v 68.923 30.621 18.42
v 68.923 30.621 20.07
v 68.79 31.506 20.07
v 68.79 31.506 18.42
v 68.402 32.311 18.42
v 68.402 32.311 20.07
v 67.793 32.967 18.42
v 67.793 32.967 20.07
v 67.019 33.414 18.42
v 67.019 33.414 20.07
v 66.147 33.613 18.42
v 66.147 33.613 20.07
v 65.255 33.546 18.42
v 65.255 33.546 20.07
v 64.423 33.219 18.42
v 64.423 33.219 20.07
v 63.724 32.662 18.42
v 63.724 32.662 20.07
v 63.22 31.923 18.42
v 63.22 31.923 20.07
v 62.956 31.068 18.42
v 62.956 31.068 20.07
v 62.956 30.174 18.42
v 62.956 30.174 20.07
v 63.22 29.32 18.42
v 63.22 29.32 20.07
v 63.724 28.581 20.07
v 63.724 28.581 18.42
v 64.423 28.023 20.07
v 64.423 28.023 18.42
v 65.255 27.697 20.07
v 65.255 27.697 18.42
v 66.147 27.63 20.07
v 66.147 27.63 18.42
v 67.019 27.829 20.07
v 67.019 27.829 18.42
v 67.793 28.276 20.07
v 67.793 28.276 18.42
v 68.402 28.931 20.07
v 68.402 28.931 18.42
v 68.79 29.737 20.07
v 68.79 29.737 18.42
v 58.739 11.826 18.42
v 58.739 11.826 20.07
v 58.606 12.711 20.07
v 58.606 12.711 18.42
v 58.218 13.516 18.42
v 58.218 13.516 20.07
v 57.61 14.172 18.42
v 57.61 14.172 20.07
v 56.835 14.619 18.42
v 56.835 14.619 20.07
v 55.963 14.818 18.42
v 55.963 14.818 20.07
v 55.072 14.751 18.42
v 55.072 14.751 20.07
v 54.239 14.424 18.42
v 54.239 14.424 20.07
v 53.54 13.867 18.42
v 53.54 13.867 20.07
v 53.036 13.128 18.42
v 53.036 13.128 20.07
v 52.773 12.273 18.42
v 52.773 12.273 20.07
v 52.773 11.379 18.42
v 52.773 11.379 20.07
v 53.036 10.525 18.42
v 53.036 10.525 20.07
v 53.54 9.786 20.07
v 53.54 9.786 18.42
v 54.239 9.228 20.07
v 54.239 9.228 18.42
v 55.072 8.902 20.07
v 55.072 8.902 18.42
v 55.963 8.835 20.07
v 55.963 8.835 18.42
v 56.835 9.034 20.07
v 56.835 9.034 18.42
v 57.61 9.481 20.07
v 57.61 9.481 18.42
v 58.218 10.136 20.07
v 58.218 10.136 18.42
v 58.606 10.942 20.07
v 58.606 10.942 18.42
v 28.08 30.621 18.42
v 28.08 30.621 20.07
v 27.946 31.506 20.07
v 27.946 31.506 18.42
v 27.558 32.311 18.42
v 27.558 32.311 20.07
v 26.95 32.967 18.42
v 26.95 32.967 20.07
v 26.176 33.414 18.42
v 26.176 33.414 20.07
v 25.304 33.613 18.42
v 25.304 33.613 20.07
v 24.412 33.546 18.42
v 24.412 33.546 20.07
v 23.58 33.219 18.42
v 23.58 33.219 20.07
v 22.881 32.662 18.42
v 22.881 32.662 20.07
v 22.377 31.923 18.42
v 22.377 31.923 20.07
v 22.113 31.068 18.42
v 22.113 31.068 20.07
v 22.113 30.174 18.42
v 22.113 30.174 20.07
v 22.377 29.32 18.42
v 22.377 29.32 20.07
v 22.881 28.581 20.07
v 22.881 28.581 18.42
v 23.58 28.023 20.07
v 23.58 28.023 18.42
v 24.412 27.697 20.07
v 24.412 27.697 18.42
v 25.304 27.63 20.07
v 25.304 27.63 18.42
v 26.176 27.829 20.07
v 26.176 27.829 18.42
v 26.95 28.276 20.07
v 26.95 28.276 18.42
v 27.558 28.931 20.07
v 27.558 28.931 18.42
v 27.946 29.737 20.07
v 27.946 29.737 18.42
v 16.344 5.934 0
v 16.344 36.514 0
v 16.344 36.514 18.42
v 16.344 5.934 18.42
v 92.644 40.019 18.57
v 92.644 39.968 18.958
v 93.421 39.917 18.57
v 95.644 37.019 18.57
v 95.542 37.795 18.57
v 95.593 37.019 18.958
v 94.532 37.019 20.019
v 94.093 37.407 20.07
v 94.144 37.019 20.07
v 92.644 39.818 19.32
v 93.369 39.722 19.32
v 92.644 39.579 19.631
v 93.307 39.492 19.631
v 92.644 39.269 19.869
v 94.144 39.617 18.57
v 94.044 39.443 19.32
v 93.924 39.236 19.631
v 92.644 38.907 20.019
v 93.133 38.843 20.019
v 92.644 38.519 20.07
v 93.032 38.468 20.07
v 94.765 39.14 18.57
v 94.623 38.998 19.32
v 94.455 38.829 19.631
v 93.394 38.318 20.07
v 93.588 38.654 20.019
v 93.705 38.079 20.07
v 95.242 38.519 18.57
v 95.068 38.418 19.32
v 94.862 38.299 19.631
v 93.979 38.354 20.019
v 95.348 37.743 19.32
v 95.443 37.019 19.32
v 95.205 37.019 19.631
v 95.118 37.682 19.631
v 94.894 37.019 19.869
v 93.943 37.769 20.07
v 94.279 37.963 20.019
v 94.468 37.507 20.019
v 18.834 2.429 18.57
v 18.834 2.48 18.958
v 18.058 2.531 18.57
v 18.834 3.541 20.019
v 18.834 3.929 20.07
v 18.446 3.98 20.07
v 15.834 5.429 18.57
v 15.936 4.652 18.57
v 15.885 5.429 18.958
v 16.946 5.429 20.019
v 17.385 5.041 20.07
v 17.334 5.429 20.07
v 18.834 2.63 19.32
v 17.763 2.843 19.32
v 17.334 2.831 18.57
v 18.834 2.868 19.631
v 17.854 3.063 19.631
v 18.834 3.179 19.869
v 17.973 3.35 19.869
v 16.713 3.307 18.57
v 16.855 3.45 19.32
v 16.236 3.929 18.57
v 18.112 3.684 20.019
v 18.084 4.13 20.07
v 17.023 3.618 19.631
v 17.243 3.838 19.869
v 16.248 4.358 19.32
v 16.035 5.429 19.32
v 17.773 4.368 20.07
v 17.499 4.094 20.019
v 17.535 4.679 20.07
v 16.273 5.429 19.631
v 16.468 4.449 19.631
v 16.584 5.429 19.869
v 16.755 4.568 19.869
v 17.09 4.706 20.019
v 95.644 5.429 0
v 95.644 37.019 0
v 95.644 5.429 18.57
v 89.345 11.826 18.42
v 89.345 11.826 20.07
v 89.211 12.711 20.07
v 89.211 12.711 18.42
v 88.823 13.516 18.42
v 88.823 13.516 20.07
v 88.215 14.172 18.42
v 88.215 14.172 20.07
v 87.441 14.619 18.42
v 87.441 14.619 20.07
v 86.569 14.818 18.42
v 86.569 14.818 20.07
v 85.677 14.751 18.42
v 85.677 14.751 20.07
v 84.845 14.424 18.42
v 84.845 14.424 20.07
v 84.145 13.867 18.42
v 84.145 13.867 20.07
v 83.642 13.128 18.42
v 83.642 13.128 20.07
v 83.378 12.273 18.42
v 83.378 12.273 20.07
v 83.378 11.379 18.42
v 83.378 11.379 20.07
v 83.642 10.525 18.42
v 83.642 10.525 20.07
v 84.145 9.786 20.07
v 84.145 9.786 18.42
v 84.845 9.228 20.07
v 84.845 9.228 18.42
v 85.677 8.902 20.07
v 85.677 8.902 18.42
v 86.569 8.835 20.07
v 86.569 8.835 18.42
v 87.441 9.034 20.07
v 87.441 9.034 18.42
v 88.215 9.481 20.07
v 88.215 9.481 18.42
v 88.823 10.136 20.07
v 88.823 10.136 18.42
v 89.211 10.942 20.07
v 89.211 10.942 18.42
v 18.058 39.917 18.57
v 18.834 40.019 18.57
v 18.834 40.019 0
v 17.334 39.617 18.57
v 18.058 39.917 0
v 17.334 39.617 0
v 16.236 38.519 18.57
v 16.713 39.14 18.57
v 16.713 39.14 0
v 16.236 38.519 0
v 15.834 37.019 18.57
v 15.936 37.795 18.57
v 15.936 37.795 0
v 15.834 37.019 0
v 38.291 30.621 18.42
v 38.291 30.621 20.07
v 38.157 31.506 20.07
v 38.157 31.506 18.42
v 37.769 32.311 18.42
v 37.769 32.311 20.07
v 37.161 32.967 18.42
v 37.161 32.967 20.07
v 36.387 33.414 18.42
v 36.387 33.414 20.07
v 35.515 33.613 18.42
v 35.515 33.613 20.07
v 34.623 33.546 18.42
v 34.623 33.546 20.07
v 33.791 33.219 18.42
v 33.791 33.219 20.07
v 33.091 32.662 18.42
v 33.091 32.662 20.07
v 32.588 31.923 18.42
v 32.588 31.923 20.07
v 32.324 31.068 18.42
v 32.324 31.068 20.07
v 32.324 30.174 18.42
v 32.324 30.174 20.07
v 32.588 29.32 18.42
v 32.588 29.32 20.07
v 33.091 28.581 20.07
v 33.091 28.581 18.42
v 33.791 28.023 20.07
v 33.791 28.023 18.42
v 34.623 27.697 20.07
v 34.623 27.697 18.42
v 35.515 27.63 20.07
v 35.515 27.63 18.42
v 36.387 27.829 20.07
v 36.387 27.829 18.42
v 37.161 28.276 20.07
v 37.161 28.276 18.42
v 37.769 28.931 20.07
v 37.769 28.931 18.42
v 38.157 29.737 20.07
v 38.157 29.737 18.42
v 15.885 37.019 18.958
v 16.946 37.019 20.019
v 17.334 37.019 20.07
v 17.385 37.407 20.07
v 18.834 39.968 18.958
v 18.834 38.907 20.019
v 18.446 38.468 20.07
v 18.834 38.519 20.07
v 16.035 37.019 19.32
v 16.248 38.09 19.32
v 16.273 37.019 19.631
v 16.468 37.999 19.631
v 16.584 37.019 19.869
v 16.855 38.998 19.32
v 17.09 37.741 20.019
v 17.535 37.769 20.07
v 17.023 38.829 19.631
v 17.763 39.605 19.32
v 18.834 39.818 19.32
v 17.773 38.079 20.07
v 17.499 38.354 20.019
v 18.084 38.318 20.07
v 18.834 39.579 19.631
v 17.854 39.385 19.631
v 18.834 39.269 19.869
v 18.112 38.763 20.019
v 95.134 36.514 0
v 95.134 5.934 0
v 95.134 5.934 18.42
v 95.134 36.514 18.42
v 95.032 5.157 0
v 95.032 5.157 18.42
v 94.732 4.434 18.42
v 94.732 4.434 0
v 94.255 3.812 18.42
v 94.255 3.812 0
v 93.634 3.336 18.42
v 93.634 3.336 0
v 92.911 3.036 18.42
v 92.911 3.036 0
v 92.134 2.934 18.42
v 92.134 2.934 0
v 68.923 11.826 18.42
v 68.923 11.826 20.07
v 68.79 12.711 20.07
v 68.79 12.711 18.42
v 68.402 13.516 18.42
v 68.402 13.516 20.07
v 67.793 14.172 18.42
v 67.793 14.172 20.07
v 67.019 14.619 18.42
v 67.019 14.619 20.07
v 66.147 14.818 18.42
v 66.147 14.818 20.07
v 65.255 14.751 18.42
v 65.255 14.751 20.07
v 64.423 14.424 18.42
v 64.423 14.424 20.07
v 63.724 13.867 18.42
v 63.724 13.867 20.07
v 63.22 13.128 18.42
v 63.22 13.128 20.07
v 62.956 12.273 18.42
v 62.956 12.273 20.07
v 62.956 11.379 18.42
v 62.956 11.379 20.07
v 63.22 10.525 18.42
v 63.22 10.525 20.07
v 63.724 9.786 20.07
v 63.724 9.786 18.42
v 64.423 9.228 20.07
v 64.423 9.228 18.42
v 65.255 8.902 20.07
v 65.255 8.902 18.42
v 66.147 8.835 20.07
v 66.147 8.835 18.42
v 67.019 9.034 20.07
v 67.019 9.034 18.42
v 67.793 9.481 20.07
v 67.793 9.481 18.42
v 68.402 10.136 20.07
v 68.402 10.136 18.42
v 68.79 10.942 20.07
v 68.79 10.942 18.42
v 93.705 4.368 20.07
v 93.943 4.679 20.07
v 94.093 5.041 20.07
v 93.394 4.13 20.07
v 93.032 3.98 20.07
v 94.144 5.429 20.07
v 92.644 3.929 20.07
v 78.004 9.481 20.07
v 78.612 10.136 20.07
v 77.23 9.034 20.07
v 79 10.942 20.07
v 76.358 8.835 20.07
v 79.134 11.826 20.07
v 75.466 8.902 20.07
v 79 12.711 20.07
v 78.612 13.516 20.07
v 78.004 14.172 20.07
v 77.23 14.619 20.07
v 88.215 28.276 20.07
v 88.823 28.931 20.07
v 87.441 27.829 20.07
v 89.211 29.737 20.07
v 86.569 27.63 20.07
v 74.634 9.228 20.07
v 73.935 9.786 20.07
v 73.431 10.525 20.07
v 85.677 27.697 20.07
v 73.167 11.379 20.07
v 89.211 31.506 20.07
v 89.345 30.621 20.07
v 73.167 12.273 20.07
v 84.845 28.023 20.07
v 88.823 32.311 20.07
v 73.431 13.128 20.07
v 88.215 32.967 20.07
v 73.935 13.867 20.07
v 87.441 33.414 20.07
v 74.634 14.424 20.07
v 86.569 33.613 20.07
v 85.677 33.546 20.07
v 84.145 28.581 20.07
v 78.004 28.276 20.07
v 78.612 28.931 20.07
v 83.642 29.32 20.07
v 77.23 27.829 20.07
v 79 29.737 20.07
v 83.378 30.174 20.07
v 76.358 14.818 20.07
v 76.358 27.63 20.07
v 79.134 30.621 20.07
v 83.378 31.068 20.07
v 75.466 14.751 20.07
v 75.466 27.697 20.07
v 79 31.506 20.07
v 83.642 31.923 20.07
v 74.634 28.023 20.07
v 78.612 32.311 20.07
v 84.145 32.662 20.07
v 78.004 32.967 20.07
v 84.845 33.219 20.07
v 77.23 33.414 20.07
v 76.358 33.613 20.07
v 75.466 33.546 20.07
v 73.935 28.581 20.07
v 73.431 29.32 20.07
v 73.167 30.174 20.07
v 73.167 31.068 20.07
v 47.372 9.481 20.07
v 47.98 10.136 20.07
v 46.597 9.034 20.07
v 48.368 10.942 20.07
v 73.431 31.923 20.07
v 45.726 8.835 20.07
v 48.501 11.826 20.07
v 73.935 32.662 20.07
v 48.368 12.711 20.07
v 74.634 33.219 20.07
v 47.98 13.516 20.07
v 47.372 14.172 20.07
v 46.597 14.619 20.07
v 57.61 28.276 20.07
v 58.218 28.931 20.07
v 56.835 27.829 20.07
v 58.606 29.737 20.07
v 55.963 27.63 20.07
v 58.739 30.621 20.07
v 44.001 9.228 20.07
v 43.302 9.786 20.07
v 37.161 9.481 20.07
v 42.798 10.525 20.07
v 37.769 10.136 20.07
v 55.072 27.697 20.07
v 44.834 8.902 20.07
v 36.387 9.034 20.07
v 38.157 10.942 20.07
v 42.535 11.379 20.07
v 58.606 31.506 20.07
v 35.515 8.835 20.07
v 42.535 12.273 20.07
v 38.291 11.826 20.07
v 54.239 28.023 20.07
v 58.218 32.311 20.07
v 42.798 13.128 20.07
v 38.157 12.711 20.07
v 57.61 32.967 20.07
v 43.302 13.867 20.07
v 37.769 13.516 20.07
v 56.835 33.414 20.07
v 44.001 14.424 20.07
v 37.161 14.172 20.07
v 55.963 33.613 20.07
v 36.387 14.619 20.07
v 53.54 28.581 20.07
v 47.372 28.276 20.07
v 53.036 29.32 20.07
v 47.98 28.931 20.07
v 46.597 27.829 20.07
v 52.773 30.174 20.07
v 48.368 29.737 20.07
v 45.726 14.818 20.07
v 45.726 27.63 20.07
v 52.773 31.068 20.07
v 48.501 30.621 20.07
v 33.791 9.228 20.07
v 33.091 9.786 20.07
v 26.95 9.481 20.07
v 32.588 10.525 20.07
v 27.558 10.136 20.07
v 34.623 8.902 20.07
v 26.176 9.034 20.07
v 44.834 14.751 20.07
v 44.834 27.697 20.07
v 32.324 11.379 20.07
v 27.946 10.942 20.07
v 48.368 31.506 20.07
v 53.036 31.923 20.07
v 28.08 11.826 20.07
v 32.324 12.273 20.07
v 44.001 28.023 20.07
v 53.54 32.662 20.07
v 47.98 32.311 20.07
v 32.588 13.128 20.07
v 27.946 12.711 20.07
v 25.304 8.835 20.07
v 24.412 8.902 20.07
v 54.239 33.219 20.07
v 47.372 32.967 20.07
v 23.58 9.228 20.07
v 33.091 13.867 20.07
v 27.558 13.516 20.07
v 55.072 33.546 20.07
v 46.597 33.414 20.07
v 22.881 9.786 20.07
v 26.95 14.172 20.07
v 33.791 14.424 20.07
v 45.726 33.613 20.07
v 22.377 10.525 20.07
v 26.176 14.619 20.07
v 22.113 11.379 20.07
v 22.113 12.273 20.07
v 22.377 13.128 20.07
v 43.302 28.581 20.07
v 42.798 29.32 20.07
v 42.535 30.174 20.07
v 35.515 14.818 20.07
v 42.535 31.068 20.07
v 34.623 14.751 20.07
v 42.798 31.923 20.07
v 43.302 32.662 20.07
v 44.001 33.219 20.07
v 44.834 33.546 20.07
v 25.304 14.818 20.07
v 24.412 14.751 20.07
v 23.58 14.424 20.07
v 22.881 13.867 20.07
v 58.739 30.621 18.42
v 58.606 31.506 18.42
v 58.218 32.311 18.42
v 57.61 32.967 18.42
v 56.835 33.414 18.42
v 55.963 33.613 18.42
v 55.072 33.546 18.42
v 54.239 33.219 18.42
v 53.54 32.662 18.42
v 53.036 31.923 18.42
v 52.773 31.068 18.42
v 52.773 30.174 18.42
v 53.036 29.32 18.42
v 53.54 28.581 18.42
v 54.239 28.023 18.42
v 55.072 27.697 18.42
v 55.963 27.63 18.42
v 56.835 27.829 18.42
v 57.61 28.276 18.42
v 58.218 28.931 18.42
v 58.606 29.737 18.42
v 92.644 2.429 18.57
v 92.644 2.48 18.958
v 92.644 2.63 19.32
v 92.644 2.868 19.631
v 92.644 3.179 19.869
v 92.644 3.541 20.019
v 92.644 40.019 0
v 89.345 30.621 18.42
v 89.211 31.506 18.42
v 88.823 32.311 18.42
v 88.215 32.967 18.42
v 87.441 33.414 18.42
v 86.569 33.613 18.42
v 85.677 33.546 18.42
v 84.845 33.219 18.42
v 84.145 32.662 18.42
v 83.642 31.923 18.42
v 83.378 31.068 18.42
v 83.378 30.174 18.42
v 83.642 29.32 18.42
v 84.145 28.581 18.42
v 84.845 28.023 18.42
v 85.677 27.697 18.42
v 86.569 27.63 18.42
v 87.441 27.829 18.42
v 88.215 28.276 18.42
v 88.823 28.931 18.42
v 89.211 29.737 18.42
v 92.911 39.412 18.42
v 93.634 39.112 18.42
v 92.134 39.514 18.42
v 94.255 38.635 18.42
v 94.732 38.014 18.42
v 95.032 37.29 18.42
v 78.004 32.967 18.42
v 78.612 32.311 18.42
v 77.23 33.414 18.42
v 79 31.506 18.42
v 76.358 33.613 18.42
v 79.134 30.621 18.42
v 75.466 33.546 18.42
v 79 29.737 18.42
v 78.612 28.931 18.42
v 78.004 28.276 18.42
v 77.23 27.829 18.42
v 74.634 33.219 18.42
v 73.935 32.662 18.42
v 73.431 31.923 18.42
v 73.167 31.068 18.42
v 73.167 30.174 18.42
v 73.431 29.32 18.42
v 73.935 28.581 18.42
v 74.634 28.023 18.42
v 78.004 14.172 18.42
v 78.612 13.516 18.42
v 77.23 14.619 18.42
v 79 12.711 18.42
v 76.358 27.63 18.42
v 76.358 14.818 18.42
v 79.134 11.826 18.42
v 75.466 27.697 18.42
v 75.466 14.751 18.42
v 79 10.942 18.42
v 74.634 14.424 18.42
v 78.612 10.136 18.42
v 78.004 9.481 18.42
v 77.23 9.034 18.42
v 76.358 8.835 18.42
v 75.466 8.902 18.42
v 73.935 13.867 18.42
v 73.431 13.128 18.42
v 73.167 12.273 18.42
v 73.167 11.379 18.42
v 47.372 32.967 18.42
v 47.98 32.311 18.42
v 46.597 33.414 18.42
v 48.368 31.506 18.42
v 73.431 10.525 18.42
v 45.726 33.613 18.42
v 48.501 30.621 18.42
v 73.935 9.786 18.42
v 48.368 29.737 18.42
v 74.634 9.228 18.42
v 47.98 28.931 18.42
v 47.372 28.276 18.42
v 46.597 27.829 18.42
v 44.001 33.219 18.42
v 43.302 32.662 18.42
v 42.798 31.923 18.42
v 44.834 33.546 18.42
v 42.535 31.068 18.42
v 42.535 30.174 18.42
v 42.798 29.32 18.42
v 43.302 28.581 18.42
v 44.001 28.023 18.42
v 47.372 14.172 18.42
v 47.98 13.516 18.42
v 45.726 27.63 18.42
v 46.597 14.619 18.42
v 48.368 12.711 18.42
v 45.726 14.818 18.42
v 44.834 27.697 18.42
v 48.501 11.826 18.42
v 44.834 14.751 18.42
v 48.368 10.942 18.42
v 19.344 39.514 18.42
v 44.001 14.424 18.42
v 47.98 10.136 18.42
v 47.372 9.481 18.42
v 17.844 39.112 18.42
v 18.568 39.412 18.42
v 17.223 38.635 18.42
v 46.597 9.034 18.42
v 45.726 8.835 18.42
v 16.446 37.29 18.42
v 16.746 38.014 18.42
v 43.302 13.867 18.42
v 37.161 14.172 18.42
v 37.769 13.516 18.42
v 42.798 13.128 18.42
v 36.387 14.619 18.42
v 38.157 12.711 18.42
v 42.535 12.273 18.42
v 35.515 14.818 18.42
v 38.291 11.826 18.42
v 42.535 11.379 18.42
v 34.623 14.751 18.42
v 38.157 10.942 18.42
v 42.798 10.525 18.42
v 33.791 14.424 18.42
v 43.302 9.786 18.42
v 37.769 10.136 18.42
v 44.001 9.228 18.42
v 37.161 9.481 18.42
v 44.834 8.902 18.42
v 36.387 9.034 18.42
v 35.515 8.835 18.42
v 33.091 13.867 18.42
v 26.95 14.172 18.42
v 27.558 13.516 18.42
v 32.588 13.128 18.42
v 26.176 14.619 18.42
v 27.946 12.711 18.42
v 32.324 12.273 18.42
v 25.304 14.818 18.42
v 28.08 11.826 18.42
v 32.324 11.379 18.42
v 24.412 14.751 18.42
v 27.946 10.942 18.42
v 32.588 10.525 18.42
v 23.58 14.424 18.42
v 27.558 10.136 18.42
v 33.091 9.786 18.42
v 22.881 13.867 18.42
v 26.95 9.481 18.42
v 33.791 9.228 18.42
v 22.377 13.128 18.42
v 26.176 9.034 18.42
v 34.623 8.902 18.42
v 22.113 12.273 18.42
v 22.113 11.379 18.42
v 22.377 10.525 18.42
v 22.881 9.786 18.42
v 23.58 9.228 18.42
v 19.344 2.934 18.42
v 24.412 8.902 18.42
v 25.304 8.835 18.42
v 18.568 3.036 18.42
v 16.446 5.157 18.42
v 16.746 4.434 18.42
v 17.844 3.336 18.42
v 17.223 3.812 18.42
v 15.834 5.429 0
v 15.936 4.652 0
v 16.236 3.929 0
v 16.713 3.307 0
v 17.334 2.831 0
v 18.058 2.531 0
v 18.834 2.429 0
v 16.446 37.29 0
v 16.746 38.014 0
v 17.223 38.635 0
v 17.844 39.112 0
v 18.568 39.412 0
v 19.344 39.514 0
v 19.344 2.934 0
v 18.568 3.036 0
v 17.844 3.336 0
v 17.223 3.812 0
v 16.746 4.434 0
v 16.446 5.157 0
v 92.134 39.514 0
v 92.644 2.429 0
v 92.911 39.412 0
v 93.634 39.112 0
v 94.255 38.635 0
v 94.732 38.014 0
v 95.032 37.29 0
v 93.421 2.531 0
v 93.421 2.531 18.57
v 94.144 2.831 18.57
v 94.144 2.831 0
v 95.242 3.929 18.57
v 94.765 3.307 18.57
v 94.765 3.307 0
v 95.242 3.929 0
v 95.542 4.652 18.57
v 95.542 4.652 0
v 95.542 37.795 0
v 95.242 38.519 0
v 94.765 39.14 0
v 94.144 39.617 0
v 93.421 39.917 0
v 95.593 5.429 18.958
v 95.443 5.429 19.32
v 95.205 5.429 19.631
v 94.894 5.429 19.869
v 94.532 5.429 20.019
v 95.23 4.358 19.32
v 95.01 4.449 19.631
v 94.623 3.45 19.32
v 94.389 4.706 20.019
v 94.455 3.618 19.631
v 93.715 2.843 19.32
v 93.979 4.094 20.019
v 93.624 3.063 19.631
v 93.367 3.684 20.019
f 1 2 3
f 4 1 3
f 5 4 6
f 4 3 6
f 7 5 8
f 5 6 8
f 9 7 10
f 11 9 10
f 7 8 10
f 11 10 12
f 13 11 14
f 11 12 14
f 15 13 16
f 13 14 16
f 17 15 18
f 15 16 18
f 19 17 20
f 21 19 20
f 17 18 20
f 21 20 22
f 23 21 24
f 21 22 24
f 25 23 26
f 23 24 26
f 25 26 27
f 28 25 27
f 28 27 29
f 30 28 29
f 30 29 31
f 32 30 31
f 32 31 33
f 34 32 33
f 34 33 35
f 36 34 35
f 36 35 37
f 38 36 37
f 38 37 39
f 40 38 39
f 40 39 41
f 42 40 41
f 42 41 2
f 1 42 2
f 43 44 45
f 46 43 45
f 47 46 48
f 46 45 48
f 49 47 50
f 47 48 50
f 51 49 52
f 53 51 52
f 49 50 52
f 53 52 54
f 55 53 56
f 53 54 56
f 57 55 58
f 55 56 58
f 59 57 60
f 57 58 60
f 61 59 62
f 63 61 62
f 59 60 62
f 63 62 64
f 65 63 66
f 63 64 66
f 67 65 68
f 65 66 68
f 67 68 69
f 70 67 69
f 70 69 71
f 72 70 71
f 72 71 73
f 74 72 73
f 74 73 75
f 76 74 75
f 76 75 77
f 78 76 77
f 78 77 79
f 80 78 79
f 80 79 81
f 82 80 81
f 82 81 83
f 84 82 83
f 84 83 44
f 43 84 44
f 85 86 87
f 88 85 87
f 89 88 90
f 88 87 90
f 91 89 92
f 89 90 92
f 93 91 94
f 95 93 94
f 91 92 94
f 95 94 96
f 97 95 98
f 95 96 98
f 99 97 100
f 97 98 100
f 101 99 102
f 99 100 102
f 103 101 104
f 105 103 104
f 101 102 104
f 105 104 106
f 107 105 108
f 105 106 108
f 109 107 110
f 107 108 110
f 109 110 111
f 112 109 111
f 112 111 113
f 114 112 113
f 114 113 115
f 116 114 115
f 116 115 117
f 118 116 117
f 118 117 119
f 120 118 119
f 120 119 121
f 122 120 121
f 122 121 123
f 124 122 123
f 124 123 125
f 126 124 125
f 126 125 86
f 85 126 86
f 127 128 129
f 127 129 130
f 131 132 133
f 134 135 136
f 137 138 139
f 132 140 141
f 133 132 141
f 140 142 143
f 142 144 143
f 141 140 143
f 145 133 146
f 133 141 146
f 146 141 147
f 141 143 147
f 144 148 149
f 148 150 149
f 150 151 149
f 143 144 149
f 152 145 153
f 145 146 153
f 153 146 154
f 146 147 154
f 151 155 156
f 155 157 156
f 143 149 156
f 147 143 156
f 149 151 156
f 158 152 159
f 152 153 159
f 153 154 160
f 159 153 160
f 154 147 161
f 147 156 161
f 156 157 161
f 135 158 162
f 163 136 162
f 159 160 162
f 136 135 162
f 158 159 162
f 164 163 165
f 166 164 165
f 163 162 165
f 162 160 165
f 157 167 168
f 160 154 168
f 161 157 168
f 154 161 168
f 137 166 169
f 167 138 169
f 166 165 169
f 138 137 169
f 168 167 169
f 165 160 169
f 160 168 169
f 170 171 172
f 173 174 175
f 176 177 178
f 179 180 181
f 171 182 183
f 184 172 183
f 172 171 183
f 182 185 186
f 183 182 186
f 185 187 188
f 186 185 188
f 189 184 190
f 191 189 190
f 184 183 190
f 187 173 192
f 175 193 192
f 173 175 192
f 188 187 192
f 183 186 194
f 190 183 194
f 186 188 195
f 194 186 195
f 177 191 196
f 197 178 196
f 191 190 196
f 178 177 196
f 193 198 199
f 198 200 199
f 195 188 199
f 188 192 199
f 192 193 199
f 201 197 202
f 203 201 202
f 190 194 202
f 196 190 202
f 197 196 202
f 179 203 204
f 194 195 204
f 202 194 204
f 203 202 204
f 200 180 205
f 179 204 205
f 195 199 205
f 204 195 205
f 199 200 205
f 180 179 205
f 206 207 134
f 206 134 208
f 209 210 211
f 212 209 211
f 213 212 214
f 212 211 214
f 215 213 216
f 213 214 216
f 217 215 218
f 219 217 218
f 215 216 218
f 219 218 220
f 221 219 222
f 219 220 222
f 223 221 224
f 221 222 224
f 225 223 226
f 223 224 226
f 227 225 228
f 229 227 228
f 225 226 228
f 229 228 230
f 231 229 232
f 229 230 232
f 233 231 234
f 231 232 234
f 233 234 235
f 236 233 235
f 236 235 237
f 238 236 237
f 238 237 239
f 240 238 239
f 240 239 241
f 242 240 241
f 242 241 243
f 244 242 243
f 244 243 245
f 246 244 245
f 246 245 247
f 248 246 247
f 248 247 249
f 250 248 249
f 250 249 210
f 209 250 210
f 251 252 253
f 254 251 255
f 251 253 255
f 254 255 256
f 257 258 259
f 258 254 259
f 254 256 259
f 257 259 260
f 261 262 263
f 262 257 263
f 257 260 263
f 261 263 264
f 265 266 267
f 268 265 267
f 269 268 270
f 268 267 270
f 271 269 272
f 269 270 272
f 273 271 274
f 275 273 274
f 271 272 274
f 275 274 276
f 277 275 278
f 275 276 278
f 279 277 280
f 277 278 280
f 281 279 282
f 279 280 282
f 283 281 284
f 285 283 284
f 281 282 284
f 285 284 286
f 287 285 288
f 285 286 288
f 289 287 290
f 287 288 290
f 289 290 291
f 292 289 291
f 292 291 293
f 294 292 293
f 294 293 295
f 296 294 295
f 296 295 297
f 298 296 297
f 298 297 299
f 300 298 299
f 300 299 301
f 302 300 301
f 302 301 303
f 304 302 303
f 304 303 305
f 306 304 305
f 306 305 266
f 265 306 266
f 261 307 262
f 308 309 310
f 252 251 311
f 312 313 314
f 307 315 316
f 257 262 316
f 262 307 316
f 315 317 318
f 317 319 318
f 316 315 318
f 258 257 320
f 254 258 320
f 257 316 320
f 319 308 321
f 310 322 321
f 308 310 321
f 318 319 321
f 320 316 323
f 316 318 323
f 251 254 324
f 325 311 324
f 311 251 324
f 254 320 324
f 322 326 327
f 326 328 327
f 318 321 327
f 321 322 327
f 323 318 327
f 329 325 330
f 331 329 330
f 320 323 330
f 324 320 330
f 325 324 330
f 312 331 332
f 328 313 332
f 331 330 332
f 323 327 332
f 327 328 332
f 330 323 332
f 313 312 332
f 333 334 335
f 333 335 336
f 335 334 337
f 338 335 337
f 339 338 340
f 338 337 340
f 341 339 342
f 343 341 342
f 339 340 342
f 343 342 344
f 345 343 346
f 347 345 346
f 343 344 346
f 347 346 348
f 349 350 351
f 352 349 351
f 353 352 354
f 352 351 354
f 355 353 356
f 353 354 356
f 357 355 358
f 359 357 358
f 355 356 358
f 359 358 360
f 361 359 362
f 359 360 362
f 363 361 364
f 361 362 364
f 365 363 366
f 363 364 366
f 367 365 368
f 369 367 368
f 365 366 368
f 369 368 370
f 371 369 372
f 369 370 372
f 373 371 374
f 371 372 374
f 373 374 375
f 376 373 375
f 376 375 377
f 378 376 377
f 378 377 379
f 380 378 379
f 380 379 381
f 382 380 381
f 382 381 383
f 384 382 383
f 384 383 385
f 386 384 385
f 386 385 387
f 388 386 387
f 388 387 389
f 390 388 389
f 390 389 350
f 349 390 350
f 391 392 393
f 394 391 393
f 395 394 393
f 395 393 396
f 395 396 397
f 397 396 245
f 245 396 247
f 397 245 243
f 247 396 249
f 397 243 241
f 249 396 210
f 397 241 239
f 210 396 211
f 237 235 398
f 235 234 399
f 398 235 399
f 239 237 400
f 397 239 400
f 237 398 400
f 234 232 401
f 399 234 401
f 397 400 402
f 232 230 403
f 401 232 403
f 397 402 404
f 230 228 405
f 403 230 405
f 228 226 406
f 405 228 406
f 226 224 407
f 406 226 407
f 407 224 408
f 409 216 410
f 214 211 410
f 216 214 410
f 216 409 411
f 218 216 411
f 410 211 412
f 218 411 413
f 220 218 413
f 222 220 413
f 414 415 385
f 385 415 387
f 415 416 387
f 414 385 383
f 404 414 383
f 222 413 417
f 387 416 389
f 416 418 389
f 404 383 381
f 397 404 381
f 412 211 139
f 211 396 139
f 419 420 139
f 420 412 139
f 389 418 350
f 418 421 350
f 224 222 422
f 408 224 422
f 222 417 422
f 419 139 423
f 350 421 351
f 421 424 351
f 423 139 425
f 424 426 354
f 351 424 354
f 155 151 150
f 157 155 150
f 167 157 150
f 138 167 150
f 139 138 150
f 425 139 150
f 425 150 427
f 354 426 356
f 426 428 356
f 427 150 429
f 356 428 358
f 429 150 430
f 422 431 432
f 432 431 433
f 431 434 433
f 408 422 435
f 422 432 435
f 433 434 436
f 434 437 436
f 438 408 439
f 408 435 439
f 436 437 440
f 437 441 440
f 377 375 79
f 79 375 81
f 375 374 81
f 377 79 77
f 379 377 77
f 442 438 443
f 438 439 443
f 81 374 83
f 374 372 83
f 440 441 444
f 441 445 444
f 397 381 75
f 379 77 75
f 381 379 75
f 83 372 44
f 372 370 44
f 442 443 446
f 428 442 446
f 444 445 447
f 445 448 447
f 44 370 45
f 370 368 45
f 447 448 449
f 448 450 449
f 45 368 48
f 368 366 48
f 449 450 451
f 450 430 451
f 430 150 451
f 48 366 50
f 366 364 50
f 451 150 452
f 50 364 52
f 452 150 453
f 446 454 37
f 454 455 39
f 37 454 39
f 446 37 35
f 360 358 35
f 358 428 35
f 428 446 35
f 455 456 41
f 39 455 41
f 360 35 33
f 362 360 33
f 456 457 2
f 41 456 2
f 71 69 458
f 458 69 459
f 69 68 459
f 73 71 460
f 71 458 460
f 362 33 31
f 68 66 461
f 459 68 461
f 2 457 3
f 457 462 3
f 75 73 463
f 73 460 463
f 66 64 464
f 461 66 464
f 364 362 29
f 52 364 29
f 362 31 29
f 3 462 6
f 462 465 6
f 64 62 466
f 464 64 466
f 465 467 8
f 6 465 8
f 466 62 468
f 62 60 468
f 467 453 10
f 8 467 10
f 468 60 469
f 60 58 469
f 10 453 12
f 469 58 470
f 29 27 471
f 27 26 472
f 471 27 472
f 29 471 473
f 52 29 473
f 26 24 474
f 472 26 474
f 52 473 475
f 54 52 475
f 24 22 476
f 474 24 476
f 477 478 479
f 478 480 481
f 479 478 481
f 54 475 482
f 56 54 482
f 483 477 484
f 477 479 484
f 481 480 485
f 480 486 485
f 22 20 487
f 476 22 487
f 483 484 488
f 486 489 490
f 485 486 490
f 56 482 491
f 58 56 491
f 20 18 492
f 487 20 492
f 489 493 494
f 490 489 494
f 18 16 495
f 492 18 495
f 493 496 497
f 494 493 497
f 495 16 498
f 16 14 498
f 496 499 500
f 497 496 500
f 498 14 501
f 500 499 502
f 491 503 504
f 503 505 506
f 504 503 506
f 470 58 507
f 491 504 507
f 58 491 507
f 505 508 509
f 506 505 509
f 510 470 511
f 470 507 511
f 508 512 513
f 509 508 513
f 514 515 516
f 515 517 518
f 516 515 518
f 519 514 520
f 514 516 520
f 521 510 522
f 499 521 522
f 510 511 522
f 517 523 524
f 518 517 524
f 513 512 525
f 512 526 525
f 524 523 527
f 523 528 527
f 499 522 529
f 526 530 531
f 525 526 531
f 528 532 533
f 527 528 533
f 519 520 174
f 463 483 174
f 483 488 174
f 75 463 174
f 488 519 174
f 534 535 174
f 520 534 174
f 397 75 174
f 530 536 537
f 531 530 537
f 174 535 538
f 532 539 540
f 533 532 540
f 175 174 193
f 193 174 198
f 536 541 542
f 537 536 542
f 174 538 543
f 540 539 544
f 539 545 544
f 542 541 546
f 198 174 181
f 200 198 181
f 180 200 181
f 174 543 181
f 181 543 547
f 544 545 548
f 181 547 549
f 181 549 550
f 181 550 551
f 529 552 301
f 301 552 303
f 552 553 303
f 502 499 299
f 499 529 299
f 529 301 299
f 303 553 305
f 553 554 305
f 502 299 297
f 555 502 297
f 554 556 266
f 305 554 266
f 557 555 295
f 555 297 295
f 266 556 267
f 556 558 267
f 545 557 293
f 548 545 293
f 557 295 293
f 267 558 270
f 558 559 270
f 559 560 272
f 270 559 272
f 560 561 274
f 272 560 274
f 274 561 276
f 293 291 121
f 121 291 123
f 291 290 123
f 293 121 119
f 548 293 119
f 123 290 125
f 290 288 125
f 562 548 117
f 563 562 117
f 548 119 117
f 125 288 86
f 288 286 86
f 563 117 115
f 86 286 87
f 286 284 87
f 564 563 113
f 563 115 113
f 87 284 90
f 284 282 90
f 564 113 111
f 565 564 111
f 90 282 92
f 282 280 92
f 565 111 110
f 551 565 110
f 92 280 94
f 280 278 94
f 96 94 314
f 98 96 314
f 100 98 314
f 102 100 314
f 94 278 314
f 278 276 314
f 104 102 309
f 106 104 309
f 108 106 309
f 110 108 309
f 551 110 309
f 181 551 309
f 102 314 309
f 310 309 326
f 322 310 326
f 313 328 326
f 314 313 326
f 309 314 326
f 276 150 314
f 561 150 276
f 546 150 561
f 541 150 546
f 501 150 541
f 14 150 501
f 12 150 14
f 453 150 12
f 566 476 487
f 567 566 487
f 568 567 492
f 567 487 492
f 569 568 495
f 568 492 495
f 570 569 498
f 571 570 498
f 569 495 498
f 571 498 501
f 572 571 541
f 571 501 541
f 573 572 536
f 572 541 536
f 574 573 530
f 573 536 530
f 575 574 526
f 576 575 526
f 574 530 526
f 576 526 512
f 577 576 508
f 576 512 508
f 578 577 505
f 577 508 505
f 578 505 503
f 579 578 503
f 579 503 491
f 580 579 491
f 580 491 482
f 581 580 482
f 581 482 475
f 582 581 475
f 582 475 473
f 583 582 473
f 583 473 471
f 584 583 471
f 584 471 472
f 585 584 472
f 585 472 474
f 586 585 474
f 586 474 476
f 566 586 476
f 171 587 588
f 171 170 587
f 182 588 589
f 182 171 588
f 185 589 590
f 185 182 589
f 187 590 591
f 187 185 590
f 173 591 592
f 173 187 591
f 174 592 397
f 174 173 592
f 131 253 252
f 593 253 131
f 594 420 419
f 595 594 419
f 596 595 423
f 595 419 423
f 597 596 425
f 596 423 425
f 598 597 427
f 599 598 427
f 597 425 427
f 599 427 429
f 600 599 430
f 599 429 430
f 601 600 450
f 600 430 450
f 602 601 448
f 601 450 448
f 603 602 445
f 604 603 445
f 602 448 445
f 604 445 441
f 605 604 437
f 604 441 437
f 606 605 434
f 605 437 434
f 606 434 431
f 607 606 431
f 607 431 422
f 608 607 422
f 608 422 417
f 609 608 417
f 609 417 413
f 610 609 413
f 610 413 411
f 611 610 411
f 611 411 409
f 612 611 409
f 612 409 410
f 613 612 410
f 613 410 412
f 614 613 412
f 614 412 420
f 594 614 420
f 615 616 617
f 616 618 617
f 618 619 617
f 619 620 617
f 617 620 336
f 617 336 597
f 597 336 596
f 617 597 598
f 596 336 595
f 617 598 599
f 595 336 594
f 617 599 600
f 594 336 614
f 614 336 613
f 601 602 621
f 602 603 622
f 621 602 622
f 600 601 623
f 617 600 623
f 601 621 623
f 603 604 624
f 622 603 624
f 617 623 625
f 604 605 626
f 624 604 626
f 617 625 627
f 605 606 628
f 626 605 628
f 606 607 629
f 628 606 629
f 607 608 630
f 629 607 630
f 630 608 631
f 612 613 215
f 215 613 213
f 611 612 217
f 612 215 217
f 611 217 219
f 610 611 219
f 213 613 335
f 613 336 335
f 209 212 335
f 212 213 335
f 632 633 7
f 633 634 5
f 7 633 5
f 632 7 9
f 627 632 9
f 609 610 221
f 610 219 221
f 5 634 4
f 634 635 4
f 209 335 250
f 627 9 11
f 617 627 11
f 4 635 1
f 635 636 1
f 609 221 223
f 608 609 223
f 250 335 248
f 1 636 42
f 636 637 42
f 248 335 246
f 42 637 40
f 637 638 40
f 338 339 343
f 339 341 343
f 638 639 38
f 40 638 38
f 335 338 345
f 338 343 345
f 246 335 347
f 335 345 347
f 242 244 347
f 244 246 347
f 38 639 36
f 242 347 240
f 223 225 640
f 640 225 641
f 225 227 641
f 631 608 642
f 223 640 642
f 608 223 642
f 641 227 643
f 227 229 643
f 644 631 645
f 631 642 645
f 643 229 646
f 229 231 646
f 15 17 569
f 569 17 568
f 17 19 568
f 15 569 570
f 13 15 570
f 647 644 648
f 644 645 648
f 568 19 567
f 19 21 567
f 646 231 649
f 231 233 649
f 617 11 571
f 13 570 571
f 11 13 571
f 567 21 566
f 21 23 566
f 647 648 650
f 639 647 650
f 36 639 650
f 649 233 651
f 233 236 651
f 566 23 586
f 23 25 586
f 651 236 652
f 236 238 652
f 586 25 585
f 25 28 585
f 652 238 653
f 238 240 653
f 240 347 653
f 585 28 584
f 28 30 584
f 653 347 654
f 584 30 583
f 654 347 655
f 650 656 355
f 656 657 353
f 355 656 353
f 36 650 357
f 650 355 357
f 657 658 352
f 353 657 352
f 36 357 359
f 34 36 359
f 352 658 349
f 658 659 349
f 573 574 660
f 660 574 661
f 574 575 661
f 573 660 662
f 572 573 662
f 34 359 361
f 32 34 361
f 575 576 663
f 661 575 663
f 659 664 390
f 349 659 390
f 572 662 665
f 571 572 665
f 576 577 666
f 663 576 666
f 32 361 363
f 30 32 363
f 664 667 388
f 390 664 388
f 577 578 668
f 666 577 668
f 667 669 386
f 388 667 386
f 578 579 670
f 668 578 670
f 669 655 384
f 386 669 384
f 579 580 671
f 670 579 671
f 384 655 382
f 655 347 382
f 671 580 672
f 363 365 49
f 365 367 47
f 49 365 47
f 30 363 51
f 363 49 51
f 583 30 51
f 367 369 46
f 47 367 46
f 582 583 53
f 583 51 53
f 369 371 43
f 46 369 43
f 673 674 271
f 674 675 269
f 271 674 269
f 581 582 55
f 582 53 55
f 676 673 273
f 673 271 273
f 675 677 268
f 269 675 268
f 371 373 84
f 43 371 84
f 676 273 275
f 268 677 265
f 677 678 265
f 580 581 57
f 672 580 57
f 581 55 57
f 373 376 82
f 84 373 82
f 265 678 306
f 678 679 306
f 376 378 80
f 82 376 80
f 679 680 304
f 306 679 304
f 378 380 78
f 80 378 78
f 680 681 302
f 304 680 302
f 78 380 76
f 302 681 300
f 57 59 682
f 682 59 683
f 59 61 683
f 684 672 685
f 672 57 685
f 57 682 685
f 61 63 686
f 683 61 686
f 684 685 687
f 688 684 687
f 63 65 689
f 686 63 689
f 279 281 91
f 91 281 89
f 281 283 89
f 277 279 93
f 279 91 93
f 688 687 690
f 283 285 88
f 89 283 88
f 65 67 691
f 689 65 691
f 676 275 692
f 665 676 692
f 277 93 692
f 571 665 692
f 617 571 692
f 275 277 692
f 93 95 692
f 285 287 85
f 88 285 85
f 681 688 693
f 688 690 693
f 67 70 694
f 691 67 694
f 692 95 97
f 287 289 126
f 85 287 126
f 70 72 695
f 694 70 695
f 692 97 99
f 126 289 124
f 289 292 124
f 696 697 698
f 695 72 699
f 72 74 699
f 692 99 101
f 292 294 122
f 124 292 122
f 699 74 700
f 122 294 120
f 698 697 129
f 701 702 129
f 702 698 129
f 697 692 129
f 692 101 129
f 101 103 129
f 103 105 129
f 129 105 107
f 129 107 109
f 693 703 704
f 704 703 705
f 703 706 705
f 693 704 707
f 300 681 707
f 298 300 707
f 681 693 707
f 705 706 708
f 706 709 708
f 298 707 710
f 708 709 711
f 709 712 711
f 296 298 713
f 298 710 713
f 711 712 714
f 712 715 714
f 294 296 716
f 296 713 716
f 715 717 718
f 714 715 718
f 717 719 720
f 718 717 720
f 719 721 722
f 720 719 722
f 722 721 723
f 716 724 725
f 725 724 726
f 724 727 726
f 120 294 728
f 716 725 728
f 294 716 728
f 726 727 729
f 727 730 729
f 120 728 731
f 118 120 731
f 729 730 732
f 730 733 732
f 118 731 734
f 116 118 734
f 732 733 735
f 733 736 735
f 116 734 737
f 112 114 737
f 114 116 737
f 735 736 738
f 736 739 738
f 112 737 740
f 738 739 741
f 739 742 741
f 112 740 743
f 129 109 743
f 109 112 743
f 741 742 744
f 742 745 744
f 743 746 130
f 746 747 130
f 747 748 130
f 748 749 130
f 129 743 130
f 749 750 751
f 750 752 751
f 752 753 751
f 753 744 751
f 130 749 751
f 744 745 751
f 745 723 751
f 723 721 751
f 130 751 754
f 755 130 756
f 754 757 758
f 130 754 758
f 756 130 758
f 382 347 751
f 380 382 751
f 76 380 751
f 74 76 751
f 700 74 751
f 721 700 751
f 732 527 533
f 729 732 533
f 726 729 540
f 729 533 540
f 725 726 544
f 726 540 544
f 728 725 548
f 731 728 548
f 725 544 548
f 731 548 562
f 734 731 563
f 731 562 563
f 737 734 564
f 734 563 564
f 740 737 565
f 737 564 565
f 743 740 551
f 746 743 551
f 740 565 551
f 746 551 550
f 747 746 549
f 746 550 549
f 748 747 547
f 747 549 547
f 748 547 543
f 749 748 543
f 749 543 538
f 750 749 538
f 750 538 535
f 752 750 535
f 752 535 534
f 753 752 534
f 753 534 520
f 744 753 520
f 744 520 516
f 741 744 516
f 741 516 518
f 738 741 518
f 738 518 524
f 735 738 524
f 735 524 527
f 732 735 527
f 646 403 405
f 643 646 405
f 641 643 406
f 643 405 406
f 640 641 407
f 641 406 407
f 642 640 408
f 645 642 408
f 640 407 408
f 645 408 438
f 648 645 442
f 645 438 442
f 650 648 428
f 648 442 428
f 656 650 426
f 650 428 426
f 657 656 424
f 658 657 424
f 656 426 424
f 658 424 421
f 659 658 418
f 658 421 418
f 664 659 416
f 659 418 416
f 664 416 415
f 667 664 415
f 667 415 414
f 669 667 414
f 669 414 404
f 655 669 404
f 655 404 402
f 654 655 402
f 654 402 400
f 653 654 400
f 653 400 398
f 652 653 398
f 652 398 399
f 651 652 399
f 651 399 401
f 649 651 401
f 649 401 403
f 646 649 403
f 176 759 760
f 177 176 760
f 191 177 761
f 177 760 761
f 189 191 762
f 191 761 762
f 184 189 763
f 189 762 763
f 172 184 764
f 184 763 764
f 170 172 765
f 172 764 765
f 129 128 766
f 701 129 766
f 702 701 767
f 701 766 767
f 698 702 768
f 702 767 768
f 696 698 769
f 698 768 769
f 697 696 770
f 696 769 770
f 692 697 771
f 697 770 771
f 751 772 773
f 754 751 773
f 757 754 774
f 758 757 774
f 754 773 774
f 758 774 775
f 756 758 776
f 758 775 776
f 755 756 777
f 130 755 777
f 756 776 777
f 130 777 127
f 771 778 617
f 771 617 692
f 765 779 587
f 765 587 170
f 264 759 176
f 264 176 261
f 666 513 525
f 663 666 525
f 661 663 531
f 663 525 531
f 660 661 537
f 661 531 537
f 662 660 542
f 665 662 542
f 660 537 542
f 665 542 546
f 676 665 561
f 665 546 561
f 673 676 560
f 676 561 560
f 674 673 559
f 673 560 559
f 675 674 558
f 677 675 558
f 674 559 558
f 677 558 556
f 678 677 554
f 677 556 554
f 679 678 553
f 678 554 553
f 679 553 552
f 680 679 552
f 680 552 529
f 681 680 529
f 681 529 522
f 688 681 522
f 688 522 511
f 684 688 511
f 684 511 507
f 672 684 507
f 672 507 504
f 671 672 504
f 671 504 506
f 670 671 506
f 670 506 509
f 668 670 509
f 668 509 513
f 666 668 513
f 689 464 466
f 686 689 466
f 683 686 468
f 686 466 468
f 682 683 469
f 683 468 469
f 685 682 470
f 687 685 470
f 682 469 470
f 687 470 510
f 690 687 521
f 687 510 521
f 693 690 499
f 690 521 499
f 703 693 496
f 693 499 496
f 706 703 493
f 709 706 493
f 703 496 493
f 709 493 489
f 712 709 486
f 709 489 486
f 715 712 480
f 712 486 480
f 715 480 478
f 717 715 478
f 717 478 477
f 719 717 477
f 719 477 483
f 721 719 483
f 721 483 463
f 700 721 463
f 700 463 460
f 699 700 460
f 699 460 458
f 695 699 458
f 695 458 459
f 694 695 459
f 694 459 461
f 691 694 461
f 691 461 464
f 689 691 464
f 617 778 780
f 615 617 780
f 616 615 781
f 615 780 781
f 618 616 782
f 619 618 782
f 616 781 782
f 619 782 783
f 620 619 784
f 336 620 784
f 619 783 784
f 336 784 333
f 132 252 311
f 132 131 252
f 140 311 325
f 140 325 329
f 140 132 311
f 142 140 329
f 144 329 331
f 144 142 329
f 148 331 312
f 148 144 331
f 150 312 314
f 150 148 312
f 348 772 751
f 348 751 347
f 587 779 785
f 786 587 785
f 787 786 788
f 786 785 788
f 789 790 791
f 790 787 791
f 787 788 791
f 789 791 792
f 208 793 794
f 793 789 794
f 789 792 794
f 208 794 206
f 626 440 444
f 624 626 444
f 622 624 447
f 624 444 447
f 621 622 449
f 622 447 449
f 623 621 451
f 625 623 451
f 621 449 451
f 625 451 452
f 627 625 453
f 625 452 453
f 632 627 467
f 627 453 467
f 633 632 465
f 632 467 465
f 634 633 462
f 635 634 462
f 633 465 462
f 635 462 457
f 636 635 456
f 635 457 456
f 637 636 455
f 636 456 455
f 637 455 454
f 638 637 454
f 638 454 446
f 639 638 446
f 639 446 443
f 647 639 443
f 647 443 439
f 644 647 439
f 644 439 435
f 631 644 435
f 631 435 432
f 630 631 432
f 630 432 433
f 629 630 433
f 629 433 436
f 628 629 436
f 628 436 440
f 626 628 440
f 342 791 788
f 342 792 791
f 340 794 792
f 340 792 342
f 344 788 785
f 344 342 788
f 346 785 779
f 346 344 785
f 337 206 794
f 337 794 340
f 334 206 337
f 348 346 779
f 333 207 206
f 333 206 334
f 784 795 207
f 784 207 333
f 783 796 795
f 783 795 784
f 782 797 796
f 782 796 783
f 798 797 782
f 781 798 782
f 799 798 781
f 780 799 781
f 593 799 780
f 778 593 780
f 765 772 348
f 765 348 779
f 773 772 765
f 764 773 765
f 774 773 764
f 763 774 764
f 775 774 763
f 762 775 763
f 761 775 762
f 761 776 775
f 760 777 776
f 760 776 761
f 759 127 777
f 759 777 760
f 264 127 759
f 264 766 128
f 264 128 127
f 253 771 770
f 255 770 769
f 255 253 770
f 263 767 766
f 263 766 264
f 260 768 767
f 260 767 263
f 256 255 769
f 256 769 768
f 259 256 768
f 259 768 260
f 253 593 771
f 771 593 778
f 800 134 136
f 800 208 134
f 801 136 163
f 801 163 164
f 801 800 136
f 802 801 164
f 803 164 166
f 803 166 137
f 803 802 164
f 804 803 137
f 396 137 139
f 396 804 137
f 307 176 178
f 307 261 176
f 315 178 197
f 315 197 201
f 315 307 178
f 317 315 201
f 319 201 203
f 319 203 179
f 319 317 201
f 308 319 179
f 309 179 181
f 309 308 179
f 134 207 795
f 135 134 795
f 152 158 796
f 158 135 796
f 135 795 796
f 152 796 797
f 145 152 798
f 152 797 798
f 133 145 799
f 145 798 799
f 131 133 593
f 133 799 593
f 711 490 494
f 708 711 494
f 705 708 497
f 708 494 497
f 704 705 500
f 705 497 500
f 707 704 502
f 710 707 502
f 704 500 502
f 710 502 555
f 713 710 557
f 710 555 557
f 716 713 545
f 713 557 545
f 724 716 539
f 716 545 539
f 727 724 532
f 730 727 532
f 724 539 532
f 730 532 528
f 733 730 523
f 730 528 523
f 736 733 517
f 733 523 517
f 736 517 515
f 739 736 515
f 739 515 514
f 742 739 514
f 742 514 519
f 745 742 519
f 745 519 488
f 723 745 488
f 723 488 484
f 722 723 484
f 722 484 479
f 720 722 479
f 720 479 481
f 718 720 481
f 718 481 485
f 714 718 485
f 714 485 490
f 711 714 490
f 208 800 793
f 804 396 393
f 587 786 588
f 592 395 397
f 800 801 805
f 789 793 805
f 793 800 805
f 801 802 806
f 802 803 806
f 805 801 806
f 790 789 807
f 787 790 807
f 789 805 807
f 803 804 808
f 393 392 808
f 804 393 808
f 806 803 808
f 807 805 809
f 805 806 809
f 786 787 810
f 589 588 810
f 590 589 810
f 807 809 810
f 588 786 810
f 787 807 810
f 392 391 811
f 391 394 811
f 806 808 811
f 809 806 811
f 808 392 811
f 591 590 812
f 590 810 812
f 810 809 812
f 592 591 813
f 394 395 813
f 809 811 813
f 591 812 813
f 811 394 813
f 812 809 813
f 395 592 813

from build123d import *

# Parameters (mm, degrees)
PAD_DEPTH     = 20.07
POCKET_DEPTH  = 18.42
SKETCH002_R   = 3
HOLE_DEPTH    = 25
SKETCH003_R   = 3
HOLE001_DEPTH = 25
SKETCH004_R   = 3
HOLE002_DEPTH = 25
SKETCH005_R   = 3
HOLE003_DEPTH = 25
SKETCH006_R   = 3
HOLE004_DEPTH = 25
SKETCH007_R   = 3
HOLE005_DEPTH = 25
SKETCH008_R   = 3
HOLE006_DEPTH = 25
FILLET_R      = 1.5
SKETCH009_R   = 3
HOLE007_DEPTH = 25
SKETCH010_R   = 3
HOLE008_DEPTH = 25
SKETCH011_R   = 3
HOLE009_DEPTH = 25
SKETCH012_R   = 3
HOLE010_DEPTH = 25
SKETCH013_R   = 3
HOLE011_DEPTH = 25
SKETCH014_R   = 3
HOLE012_DEPTH = 25
SKETCH015_R   = 3
HOLE013_DEPTH = 25


with BuildPart() as part:
    # Sketch → Pad (new body)
    with BuildSketch(Plane.XY):
        with BuildLine():
            Line((18.834122, 40.018788), (92.644122, 40.018788))
            ThreePointArc((95.644122, 37.018788), (94.765442, 39.140108), (92.644122, 40.018788))
            Line((95.644122, 37.018788), (95.644122, 5.428788))
            ThreePointArc((92.644122, 2.428788), (94.765442, 3.307467), (95.644122, 5.428788))
            Line((92.644122, 2.428788), (18.834122, 2.428788))
            ThreePointArc((15.834122, 5.428788), (16.712801, 3.307467), (18.834122, 2.428788))
            Line((15.834122, 5.428788), (15.834122, 37.018788))
            ThreePointArc((18.834122, 40.018788), (16.712801, 39.140108), (15.834122, 37.018788))
        make_face()
    extrude(amount=PAD_DEPTH)

    # Sketch001 (on Face9 of Pad) → Pocket (cut)
    with BuildSketch(Plane(origin=(0, 0, 0), x_dir=(1, 0, 0), z_dir=(0, 0, -1))):
        with BuildLine():
            Line((19.344122, -2.933788), (92.134122, -2.933788))
            ThreePointArc((95.134122, -5.933788), (94.255442, -3.812467), (92.134122, -2.933788))
            Line((95.134122, -5.933788), (95.134122, -36.513788))
            ThreePointArc((92.134122, -39.513788), (94.255442, -38.635108), (95.134122, -36.513788))
            Line((92.134122, -39.513788), (19.344122, -39.513788))
            ThreePointArc((16.344122, -36.513788), (17.222801, -38.635108), (19.344122, -39.513788))
            Line((16.344122, -36.513788), (16.344122, -5.933788))
            ThreePointArc((19.344122, -2.933788), (17.222801, -3.812467), (16.344122, -5.933788))
        make_face()
    extrude(amount=-POCKET_DEPTH, mode=Mode.SUBTRACT)

    # Sketch002 (on Face5 of Pocket) → Hole (cut)
    with BuildSketch(Plane.XY.offset(20.07)):
        with Locations((55.739122, 30.621288)):
            Circle(SKETCH002_R)
    extrude(amount=-HOLE_DEPTH, mode=Mode.SUBTRACT)

    # Sketch003 (on Face5 of Hole) → Hole001 (cut)
    with BuildSketch(Plane.XY.offset(20.07)):
        with Locations((45.501322, 30.621288)):
            Circle(SKETCH003_R)
    extrude(amount=-HOLE001_DEPTH, mode=Mode.SUBTRACT)

    # Sketch004 (on Face5 of Hole001) → Hole002 (cut)
    with BuildSketch(Plane.XY.offset(20.07)):
        with Locations((35.290522, 30.621288)):
            Circle(SKETCH004_R)
    extrude(amount=-HOLE002_DEPTH, mode=Mode.SUBTRACT)

    # Sketch005 (on Face5 of Hole002) → Hole003 (cut)
    with BuildSketch(Plane.XY.offset(20.07)):
        with Locations((25.079722, 30.621288)):
            Circle(SKETCH005_R)
    extrude(amount=-HOLE003_DEPTH, mode=Mode.SUBTRACT)

    # Sketch006 (on Face5 of Hole003) → Hole004 (cut)
    with BuildSketch(Plane.XY.offset(20.07)):
        with Locations((65.922922, 30.621288)):
            Circle(SKETCH006_R)
    extrude(amount=-HOLE004_DEPTH, mode=Mode.SUBTRACT)

    # Sketch007 (on Face5 of Hole004) → Hole005 (cut)
    with BuildSketch(Plane.XY.offset(20.07)):
        with Locations((76.133722, 30.621288)):
            Circle(SKETCH007_R)
    extrude(amount=-HOLE005_DEPTH, mode=Mode.SUBTRACT)

    # Sketch008 (on Face5 of Hole005) → Hole006 (cut)
    with BuildSketch(Plane.XY.offset(20.07)):
        with Locations((86.344522, 30.621288)):
            Circle(SKETCH008_R)
    extrude(amount=-HOLE006_DEPTH, mode=Mode.SUBTRACT)

    # Fillet
    fillet_edges = [part.edges().sort_by_distance(p)[0] for p in [
        (55.739122, 40.018788, 20.07),
    ]]
    fillet(fillet_edges, radius=FILLET_R)

    # Sketch009 (on Face8 of Fillet) → Hole007 (cut)
    with BuildSketch(Plane.XY.offset(20.07)):
        with Locations((55.739122, 11.826288)):
            Circle(SKETCH009_R)
    extrude(amount=-HOLE007_DEPTH, mode=Mode.SUBTRACT)

    # Sketch010 (on Face8 of Hole007) → Hole008 (cut)
    with BuildSketch(Plane.XY.offset(20.07)):
        with Locations((45.501322, 11.826288)):
            Circle(SKETCH010_R)
    extrude(amount=-HOLE008_DEPTH, mode=Mode.SUBTRACT)

    # Sketch011 (on Face8 of Hole008) → Hole009 (cut)
    with BuildSketch(Plane.XY.offset(20.07)):
        with Locations((35.290522, 11.826288)):
            Circle(SKETCH011_R)
    extrude(amount=-HOLE009_DEPTH, mode=Mode.SUBTRACT)

    # Sketch012 (on Face8 of Hole009) → Hole010 (cut)
    with BuildSketch(Plane.XY.offset(20.07)):
        with Locations((25.079722, 11.826288)):
            Circle(SKETCH012_R)
    extrude(amount=-HOLE010_DEPTH, mode=Mode.SUBTRACT)

    # Sketch013 (on Face8 of Hole010) → Hole011 (cut)
    with BuildSketch(Plane.XY.offset(20.07)):
        with Locations((65.922922, 11.826288)):
            Circle(SKETCH013_R)
    extrude(amount=-HOLE011_DEPTH, mode=Mode.SUBTRACT)

    # Sketch014 (on Face8 of Hole011) → Hole012 (cut)
    with BuildSketch(Plane.XY.offset(20.07)):
        with Locations((76.133722, 11.826288)):
            Circle(SKETCH014_R)
    extrude(amount=-HOLE012_DEPTH, mode=Mode.SUBTRACT)

    # Sketch015 (on Face8 of Hole012) → Hole013 (cut)
    with BuildSketch(Plane.XY.offset(20.07)):
        with Locations((86.344522, 11.826288)):
            Circle(SKETCH015_R)
    extrude(amount=-HOLE013_DEPTH, mode=Mode.SUBTRACT)


solid = part.part
